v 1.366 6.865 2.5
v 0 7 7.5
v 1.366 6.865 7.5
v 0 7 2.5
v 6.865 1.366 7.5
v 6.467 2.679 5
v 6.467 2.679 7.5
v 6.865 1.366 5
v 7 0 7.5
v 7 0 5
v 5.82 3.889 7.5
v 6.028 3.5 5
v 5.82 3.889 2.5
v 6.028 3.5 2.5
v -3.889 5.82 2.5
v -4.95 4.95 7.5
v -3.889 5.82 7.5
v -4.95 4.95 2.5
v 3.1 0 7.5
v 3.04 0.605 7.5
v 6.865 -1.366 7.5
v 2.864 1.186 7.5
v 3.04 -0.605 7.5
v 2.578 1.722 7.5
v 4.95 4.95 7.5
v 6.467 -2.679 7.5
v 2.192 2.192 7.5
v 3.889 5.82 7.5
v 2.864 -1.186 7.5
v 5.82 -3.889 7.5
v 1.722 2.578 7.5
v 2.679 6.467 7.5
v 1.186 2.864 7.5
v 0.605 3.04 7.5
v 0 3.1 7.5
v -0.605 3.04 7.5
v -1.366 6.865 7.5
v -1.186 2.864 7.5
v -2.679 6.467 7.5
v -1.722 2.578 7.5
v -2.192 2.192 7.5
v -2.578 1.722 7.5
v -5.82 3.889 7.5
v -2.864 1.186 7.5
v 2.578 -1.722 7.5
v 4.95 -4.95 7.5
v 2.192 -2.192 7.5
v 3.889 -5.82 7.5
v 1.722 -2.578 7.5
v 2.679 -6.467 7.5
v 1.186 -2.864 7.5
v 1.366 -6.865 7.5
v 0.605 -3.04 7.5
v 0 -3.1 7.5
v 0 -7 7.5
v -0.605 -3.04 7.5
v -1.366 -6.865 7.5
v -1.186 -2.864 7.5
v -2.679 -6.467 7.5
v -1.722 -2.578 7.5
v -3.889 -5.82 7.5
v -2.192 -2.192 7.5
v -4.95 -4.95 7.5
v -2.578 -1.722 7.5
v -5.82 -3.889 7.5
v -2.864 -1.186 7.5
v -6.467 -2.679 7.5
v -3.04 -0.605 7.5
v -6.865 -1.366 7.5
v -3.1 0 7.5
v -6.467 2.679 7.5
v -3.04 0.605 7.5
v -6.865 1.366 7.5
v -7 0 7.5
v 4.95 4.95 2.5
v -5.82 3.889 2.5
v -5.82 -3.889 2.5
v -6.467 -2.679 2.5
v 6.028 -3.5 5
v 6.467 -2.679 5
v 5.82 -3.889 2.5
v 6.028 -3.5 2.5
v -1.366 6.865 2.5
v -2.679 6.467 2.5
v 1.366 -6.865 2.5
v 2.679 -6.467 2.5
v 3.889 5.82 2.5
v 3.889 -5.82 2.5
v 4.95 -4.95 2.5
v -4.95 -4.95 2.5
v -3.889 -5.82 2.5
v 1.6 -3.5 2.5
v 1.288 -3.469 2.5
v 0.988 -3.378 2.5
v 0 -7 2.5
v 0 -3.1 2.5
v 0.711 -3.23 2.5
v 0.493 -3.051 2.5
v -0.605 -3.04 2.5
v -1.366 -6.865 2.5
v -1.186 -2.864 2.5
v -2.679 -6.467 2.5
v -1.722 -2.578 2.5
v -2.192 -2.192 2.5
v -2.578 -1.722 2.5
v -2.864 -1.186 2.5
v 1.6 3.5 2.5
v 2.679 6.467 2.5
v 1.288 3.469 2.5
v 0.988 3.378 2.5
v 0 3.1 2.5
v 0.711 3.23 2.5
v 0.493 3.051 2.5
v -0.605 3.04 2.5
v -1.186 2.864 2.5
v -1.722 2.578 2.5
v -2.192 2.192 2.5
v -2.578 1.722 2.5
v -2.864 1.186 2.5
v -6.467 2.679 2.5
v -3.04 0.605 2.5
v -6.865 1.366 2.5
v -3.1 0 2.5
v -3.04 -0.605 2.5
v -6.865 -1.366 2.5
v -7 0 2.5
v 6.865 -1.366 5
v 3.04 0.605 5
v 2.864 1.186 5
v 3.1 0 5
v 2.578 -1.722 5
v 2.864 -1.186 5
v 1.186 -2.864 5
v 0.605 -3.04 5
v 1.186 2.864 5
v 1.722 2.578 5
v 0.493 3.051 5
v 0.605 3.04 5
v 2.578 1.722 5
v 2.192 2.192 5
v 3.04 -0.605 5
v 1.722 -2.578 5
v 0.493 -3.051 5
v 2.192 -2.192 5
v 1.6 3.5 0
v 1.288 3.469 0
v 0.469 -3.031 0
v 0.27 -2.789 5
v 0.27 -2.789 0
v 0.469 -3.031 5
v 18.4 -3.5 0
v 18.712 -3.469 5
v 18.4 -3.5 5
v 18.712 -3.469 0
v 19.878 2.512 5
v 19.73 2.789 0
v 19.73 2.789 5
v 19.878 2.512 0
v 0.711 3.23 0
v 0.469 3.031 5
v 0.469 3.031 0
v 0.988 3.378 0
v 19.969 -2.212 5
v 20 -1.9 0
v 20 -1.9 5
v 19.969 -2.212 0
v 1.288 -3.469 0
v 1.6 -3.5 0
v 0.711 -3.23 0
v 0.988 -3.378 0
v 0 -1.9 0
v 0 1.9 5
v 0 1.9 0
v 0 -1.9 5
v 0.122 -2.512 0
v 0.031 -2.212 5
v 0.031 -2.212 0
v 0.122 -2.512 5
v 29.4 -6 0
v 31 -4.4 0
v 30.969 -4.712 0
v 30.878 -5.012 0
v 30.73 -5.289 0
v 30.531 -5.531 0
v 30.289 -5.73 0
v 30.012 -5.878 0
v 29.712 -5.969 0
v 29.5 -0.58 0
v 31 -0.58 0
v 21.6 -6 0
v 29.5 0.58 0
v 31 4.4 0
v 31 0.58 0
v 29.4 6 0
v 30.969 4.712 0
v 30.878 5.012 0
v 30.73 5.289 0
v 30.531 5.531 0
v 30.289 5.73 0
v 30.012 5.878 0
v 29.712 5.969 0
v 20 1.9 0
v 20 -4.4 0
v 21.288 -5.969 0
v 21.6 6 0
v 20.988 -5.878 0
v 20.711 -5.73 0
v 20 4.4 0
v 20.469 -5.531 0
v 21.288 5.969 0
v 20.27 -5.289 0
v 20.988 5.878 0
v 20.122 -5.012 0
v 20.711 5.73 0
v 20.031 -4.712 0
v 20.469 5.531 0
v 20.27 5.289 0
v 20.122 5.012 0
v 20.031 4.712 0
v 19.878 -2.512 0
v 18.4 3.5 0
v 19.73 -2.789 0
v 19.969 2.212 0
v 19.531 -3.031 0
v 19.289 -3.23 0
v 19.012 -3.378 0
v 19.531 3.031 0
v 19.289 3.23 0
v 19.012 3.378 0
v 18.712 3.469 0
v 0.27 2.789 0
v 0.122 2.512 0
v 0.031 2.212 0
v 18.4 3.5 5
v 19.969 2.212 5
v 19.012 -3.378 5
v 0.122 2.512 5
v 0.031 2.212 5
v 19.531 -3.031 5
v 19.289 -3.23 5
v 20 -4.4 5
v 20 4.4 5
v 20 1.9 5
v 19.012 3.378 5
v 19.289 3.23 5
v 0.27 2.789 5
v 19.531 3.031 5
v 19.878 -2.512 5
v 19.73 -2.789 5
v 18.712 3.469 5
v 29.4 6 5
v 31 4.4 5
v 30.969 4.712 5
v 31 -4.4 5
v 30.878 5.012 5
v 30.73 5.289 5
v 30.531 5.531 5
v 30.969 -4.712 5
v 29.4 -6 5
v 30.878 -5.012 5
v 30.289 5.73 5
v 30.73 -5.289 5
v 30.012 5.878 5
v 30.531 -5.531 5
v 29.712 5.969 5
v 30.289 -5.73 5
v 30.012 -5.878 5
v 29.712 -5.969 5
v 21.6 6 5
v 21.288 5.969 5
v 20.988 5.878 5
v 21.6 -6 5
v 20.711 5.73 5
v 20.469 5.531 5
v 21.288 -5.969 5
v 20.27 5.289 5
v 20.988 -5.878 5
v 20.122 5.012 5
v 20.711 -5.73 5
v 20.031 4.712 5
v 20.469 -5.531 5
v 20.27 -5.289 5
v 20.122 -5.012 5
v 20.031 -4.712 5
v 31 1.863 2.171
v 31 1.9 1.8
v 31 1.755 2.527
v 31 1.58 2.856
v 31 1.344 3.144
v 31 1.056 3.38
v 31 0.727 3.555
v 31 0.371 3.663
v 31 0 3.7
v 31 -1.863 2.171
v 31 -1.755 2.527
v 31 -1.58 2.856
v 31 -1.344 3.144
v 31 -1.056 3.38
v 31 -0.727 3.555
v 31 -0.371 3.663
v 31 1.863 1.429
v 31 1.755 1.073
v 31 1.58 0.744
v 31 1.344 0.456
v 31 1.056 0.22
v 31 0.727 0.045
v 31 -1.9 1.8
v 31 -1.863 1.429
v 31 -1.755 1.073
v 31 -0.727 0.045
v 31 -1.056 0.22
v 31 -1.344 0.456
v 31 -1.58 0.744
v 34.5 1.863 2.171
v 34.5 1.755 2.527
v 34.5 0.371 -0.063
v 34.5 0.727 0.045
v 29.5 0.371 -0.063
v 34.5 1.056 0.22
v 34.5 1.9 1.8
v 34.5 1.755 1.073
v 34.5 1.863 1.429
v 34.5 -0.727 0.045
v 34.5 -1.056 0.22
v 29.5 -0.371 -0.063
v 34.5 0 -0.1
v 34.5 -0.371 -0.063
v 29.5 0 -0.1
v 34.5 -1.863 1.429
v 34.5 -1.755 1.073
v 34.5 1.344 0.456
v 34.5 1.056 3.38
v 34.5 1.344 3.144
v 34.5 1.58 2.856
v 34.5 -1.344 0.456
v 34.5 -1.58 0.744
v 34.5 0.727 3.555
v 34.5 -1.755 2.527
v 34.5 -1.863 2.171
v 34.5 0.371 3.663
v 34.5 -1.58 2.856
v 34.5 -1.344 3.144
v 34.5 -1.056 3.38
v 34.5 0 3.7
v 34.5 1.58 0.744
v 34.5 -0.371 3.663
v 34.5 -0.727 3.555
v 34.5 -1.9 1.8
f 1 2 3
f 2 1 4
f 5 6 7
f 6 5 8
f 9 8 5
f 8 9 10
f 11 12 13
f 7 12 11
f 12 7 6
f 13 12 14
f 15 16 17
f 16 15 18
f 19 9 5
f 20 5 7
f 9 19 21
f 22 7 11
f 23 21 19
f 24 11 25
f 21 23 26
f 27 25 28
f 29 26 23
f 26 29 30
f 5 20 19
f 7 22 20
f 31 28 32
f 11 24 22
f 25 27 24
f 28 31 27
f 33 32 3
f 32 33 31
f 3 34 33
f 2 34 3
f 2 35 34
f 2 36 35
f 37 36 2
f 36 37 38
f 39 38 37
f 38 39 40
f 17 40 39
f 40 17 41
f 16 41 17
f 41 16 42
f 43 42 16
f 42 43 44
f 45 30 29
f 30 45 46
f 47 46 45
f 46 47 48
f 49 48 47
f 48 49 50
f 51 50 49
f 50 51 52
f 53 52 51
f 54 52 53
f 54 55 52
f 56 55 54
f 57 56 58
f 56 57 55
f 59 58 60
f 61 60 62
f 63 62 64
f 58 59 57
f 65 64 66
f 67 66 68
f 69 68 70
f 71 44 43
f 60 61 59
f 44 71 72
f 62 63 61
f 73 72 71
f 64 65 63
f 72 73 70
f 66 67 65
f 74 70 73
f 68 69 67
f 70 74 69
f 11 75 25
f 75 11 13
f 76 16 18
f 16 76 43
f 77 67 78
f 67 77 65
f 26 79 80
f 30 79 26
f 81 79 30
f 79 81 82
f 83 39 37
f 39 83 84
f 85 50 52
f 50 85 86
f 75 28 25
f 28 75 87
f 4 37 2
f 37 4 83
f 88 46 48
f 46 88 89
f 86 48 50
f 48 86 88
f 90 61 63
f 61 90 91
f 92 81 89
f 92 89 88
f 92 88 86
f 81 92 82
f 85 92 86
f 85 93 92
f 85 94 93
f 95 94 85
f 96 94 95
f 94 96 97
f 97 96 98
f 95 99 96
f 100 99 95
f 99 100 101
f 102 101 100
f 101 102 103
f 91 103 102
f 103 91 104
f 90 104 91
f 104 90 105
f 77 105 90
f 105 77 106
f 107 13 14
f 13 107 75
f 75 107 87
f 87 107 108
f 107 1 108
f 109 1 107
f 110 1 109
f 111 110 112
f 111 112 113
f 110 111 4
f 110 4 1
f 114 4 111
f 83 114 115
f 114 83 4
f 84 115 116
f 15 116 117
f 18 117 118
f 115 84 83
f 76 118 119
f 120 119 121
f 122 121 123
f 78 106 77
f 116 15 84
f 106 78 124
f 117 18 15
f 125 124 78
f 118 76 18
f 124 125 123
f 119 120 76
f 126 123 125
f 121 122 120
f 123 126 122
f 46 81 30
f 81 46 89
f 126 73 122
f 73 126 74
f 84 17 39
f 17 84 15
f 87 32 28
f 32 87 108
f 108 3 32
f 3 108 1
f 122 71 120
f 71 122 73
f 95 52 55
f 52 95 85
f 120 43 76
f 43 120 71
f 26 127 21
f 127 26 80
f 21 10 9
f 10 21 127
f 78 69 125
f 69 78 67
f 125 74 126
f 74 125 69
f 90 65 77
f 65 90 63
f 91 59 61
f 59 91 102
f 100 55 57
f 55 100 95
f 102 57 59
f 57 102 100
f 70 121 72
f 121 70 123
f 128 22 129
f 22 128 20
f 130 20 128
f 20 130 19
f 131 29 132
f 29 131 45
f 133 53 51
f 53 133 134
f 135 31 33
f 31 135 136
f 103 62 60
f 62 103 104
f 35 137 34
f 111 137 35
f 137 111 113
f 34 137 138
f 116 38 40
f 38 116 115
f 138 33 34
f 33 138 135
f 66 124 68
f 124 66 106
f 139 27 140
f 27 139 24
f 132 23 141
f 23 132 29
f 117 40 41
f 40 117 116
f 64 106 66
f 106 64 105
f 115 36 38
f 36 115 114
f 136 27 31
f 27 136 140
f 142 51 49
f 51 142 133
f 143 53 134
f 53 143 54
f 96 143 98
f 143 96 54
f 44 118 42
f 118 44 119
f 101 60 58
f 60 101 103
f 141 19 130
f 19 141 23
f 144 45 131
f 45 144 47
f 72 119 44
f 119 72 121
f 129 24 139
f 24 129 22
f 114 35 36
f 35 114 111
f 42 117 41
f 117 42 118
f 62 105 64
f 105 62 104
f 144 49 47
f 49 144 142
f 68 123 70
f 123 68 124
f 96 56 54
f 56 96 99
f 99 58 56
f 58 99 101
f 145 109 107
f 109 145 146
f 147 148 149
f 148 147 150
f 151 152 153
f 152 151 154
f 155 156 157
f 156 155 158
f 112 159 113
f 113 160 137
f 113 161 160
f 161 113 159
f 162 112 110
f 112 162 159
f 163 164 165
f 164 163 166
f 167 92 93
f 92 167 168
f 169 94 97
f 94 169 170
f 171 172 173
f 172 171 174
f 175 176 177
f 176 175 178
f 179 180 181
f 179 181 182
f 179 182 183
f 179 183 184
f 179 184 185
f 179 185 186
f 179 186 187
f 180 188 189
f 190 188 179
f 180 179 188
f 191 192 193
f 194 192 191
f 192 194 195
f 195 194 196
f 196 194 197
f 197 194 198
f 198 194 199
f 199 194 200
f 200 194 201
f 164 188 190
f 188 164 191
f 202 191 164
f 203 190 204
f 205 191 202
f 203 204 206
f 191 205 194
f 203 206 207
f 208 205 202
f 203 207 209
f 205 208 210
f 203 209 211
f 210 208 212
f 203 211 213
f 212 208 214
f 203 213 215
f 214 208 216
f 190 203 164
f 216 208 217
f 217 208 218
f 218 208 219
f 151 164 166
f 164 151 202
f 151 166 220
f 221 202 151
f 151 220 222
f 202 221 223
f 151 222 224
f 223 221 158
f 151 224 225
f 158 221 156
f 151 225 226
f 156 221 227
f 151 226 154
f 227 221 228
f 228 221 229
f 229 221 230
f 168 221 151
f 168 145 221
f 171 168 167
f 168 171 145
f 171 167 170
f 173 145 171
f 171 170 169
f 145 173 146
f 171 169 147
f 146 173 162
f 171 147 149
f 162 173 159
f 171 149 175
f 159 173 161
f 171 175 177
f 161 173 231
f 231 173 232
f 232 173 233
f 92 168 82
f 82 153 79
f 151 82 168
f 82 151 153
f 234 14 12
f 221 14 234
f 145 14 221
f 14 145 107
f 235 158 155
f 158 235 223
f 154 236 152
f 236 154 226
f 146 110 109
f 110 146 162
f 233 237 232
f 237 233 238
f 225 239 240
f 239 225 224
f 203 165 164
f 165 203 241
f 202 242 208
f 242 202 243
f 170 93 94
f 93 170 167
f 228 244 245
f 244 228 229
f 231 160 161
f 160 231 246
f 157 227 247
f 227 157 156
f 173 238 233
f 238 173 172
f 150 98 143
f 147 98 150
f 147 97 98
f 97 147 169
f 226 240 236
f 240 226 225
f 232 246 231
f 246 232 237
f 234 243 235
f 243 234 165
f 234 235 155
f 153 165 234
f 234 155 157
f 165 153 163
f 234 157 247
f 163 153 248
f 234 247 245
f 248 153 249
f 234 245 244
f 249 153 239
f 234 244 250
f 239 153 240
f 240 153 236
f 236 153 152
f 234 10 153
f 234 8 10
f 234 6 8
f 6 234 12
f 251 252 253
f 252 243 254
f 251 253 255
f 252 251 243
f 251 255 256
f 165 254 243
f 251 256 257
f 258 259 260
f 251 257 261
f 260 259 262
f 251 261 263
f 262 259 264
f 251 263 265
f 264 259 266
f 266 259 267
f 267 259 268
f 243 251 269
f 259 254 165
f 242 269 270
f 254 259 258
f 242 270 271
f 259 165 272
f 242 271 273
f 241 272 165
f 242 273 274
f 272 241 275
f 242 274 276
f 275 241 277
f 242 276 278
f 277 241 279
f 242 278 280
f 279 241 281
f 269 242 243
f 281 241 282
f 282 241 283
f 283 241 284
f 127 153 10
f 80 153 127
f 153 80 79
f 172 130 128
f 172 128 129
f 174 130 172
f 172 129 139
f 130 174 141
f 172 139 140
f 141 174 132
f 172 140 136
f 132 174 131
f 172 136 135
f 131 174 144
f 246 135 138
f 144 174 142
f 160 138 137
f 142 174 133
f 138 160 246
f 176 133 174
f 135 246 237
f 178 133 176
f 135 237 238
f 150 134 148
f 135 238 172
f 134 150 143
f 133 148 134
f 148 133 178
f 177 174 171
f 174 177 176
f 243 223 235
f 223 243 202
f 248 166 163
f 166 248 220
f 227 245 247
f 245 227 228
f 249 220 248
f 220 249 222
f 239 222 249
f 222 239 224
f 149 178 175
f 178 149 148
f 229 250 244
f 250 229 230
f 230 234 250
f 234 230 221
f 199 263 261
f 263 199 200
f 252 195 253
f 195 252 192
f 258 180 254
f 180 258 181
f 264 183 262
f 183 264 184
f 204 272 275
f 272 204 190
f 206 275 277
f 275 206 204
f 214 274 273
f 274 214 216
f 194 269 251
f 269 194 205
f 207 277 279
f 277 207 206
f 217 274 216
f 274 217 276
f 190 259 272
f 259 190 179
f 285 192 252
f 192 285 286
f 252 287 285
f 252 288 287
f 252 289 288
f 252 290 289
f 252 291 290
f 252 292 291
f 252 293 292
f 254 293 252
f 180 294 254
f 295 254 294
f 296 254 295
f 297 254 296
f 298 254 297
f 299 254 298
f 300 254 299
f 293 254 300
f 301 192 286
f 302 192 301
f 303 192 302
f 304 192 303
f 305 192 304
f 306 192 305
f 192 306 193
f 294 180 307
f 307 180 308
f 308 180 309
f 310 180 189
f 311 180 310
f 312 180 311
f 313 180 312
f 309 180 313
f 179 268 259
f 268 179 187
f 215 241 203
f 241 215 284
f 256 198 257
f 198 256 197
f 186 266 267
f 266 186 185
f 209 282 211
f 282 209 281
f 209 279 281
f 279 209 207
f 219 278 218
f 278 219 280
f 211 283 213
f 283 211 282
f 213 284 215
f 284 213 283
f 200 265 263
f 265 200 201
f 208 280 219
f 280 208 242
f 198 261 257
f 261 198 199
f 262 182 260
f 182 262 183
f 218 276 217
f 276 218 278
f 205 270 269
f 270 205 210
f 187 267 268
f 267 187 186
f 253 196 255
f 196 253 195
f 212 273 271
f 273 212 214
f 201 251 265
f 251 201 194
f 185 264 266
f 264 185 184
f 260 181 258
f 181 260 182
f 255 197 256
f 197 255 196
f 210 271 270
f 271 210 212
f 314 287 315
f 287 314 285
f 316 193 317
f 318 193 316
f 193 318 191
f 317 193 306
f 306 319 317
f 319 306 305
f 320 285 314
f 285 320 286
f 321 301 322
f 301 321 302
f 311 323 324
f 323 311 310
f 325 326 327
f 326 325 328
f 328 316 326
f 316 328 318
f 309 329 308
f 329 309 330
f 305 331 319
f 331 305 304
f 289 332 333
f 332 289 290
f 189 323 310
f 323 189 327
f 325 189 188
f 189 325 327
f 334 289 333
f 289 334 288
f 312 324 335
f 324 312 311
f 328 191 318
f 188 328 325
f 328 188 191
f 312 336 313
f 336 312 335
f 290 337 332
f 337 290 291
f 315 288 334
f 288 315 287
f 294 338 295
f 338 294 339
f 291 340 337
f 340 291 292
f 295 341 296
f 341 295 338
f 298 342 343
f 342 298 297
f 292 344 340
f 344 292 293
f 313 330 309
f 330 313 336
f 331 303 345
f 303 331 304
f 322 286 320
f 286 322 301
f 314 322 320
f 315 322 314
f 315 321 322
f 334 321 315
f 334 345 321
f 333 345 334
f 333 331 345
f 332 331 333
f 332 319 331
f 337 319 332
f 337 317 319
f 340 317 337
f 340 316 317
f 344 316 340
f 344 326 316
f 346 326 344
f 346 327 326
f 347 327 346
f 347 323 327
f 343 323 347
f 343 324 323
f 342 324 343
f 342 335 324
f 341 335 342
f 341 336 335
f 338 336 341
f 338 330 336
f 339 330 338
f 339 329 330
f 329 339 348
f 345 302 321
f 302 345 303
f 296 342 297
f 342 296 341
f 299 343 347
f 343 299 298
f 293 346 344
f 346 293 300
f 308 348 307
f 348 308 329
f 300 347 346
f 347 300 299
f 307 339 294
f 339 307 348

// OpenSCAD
include <s1_parameters.scad>

build_part = "front";

module pivot_ring() {
  difference() {
    cylinder(h = 5, r = 7);
    translate([0, 0, -1]) cylinder(h = 7, r = s1_coupler_pivot_diameter / 2 + s1_printer_tolerance);
  }
}

module front_coupler() {
  union() {
    translate([0, 0, 2.5]) pivot_ring();
    translate([s1_coupler_drawbar_length / 2, 0, 0])
      rounded_box([s1_coupler_drawbar_length, 7, 5], 1.6);
    translate([s1_coupler_drawbar_length + 5.5, 0, 0])
      rounded_box([11, 12, 5], 1.6);
    translate([s1_coupler_drawbar_length + 12, 0, 1.8])
      rotate([0, 90, 0]) cylinder(h = 5, r = 1.9, center = true);
  }
}

module rear_coupler() {
  difference() {
    union() {
      translate([0, 0, 2.5]) pivot_ring();
      translate([-s1_coupler_drawbar_length / 2, 0, 0])
        rounded_box([s1_coupler_drawbar_length, 7, 5], 1.6);
      translate([-s1_coupler_drawbar_length - 6, 0, 0])
        rounded_box([14, 15, 5], 1.6);
    }
    translate([-s1_coupler_drawbar_length - 6, 0, 1.8])
      rounded_box([16, 6 + 2 * s1_printer_tolerance, 7], 1.3);
    translate([-s1_coupler_drawbar_length - 13, 0, 1.8])
      rotate([0, 90, 0]) cylinder(h = 6, r = 2.2 + s1_printer_tolerance, center = true);
  }
}

if (build_part == "rear")
  rear_coupler();
else
  front_coupler();
